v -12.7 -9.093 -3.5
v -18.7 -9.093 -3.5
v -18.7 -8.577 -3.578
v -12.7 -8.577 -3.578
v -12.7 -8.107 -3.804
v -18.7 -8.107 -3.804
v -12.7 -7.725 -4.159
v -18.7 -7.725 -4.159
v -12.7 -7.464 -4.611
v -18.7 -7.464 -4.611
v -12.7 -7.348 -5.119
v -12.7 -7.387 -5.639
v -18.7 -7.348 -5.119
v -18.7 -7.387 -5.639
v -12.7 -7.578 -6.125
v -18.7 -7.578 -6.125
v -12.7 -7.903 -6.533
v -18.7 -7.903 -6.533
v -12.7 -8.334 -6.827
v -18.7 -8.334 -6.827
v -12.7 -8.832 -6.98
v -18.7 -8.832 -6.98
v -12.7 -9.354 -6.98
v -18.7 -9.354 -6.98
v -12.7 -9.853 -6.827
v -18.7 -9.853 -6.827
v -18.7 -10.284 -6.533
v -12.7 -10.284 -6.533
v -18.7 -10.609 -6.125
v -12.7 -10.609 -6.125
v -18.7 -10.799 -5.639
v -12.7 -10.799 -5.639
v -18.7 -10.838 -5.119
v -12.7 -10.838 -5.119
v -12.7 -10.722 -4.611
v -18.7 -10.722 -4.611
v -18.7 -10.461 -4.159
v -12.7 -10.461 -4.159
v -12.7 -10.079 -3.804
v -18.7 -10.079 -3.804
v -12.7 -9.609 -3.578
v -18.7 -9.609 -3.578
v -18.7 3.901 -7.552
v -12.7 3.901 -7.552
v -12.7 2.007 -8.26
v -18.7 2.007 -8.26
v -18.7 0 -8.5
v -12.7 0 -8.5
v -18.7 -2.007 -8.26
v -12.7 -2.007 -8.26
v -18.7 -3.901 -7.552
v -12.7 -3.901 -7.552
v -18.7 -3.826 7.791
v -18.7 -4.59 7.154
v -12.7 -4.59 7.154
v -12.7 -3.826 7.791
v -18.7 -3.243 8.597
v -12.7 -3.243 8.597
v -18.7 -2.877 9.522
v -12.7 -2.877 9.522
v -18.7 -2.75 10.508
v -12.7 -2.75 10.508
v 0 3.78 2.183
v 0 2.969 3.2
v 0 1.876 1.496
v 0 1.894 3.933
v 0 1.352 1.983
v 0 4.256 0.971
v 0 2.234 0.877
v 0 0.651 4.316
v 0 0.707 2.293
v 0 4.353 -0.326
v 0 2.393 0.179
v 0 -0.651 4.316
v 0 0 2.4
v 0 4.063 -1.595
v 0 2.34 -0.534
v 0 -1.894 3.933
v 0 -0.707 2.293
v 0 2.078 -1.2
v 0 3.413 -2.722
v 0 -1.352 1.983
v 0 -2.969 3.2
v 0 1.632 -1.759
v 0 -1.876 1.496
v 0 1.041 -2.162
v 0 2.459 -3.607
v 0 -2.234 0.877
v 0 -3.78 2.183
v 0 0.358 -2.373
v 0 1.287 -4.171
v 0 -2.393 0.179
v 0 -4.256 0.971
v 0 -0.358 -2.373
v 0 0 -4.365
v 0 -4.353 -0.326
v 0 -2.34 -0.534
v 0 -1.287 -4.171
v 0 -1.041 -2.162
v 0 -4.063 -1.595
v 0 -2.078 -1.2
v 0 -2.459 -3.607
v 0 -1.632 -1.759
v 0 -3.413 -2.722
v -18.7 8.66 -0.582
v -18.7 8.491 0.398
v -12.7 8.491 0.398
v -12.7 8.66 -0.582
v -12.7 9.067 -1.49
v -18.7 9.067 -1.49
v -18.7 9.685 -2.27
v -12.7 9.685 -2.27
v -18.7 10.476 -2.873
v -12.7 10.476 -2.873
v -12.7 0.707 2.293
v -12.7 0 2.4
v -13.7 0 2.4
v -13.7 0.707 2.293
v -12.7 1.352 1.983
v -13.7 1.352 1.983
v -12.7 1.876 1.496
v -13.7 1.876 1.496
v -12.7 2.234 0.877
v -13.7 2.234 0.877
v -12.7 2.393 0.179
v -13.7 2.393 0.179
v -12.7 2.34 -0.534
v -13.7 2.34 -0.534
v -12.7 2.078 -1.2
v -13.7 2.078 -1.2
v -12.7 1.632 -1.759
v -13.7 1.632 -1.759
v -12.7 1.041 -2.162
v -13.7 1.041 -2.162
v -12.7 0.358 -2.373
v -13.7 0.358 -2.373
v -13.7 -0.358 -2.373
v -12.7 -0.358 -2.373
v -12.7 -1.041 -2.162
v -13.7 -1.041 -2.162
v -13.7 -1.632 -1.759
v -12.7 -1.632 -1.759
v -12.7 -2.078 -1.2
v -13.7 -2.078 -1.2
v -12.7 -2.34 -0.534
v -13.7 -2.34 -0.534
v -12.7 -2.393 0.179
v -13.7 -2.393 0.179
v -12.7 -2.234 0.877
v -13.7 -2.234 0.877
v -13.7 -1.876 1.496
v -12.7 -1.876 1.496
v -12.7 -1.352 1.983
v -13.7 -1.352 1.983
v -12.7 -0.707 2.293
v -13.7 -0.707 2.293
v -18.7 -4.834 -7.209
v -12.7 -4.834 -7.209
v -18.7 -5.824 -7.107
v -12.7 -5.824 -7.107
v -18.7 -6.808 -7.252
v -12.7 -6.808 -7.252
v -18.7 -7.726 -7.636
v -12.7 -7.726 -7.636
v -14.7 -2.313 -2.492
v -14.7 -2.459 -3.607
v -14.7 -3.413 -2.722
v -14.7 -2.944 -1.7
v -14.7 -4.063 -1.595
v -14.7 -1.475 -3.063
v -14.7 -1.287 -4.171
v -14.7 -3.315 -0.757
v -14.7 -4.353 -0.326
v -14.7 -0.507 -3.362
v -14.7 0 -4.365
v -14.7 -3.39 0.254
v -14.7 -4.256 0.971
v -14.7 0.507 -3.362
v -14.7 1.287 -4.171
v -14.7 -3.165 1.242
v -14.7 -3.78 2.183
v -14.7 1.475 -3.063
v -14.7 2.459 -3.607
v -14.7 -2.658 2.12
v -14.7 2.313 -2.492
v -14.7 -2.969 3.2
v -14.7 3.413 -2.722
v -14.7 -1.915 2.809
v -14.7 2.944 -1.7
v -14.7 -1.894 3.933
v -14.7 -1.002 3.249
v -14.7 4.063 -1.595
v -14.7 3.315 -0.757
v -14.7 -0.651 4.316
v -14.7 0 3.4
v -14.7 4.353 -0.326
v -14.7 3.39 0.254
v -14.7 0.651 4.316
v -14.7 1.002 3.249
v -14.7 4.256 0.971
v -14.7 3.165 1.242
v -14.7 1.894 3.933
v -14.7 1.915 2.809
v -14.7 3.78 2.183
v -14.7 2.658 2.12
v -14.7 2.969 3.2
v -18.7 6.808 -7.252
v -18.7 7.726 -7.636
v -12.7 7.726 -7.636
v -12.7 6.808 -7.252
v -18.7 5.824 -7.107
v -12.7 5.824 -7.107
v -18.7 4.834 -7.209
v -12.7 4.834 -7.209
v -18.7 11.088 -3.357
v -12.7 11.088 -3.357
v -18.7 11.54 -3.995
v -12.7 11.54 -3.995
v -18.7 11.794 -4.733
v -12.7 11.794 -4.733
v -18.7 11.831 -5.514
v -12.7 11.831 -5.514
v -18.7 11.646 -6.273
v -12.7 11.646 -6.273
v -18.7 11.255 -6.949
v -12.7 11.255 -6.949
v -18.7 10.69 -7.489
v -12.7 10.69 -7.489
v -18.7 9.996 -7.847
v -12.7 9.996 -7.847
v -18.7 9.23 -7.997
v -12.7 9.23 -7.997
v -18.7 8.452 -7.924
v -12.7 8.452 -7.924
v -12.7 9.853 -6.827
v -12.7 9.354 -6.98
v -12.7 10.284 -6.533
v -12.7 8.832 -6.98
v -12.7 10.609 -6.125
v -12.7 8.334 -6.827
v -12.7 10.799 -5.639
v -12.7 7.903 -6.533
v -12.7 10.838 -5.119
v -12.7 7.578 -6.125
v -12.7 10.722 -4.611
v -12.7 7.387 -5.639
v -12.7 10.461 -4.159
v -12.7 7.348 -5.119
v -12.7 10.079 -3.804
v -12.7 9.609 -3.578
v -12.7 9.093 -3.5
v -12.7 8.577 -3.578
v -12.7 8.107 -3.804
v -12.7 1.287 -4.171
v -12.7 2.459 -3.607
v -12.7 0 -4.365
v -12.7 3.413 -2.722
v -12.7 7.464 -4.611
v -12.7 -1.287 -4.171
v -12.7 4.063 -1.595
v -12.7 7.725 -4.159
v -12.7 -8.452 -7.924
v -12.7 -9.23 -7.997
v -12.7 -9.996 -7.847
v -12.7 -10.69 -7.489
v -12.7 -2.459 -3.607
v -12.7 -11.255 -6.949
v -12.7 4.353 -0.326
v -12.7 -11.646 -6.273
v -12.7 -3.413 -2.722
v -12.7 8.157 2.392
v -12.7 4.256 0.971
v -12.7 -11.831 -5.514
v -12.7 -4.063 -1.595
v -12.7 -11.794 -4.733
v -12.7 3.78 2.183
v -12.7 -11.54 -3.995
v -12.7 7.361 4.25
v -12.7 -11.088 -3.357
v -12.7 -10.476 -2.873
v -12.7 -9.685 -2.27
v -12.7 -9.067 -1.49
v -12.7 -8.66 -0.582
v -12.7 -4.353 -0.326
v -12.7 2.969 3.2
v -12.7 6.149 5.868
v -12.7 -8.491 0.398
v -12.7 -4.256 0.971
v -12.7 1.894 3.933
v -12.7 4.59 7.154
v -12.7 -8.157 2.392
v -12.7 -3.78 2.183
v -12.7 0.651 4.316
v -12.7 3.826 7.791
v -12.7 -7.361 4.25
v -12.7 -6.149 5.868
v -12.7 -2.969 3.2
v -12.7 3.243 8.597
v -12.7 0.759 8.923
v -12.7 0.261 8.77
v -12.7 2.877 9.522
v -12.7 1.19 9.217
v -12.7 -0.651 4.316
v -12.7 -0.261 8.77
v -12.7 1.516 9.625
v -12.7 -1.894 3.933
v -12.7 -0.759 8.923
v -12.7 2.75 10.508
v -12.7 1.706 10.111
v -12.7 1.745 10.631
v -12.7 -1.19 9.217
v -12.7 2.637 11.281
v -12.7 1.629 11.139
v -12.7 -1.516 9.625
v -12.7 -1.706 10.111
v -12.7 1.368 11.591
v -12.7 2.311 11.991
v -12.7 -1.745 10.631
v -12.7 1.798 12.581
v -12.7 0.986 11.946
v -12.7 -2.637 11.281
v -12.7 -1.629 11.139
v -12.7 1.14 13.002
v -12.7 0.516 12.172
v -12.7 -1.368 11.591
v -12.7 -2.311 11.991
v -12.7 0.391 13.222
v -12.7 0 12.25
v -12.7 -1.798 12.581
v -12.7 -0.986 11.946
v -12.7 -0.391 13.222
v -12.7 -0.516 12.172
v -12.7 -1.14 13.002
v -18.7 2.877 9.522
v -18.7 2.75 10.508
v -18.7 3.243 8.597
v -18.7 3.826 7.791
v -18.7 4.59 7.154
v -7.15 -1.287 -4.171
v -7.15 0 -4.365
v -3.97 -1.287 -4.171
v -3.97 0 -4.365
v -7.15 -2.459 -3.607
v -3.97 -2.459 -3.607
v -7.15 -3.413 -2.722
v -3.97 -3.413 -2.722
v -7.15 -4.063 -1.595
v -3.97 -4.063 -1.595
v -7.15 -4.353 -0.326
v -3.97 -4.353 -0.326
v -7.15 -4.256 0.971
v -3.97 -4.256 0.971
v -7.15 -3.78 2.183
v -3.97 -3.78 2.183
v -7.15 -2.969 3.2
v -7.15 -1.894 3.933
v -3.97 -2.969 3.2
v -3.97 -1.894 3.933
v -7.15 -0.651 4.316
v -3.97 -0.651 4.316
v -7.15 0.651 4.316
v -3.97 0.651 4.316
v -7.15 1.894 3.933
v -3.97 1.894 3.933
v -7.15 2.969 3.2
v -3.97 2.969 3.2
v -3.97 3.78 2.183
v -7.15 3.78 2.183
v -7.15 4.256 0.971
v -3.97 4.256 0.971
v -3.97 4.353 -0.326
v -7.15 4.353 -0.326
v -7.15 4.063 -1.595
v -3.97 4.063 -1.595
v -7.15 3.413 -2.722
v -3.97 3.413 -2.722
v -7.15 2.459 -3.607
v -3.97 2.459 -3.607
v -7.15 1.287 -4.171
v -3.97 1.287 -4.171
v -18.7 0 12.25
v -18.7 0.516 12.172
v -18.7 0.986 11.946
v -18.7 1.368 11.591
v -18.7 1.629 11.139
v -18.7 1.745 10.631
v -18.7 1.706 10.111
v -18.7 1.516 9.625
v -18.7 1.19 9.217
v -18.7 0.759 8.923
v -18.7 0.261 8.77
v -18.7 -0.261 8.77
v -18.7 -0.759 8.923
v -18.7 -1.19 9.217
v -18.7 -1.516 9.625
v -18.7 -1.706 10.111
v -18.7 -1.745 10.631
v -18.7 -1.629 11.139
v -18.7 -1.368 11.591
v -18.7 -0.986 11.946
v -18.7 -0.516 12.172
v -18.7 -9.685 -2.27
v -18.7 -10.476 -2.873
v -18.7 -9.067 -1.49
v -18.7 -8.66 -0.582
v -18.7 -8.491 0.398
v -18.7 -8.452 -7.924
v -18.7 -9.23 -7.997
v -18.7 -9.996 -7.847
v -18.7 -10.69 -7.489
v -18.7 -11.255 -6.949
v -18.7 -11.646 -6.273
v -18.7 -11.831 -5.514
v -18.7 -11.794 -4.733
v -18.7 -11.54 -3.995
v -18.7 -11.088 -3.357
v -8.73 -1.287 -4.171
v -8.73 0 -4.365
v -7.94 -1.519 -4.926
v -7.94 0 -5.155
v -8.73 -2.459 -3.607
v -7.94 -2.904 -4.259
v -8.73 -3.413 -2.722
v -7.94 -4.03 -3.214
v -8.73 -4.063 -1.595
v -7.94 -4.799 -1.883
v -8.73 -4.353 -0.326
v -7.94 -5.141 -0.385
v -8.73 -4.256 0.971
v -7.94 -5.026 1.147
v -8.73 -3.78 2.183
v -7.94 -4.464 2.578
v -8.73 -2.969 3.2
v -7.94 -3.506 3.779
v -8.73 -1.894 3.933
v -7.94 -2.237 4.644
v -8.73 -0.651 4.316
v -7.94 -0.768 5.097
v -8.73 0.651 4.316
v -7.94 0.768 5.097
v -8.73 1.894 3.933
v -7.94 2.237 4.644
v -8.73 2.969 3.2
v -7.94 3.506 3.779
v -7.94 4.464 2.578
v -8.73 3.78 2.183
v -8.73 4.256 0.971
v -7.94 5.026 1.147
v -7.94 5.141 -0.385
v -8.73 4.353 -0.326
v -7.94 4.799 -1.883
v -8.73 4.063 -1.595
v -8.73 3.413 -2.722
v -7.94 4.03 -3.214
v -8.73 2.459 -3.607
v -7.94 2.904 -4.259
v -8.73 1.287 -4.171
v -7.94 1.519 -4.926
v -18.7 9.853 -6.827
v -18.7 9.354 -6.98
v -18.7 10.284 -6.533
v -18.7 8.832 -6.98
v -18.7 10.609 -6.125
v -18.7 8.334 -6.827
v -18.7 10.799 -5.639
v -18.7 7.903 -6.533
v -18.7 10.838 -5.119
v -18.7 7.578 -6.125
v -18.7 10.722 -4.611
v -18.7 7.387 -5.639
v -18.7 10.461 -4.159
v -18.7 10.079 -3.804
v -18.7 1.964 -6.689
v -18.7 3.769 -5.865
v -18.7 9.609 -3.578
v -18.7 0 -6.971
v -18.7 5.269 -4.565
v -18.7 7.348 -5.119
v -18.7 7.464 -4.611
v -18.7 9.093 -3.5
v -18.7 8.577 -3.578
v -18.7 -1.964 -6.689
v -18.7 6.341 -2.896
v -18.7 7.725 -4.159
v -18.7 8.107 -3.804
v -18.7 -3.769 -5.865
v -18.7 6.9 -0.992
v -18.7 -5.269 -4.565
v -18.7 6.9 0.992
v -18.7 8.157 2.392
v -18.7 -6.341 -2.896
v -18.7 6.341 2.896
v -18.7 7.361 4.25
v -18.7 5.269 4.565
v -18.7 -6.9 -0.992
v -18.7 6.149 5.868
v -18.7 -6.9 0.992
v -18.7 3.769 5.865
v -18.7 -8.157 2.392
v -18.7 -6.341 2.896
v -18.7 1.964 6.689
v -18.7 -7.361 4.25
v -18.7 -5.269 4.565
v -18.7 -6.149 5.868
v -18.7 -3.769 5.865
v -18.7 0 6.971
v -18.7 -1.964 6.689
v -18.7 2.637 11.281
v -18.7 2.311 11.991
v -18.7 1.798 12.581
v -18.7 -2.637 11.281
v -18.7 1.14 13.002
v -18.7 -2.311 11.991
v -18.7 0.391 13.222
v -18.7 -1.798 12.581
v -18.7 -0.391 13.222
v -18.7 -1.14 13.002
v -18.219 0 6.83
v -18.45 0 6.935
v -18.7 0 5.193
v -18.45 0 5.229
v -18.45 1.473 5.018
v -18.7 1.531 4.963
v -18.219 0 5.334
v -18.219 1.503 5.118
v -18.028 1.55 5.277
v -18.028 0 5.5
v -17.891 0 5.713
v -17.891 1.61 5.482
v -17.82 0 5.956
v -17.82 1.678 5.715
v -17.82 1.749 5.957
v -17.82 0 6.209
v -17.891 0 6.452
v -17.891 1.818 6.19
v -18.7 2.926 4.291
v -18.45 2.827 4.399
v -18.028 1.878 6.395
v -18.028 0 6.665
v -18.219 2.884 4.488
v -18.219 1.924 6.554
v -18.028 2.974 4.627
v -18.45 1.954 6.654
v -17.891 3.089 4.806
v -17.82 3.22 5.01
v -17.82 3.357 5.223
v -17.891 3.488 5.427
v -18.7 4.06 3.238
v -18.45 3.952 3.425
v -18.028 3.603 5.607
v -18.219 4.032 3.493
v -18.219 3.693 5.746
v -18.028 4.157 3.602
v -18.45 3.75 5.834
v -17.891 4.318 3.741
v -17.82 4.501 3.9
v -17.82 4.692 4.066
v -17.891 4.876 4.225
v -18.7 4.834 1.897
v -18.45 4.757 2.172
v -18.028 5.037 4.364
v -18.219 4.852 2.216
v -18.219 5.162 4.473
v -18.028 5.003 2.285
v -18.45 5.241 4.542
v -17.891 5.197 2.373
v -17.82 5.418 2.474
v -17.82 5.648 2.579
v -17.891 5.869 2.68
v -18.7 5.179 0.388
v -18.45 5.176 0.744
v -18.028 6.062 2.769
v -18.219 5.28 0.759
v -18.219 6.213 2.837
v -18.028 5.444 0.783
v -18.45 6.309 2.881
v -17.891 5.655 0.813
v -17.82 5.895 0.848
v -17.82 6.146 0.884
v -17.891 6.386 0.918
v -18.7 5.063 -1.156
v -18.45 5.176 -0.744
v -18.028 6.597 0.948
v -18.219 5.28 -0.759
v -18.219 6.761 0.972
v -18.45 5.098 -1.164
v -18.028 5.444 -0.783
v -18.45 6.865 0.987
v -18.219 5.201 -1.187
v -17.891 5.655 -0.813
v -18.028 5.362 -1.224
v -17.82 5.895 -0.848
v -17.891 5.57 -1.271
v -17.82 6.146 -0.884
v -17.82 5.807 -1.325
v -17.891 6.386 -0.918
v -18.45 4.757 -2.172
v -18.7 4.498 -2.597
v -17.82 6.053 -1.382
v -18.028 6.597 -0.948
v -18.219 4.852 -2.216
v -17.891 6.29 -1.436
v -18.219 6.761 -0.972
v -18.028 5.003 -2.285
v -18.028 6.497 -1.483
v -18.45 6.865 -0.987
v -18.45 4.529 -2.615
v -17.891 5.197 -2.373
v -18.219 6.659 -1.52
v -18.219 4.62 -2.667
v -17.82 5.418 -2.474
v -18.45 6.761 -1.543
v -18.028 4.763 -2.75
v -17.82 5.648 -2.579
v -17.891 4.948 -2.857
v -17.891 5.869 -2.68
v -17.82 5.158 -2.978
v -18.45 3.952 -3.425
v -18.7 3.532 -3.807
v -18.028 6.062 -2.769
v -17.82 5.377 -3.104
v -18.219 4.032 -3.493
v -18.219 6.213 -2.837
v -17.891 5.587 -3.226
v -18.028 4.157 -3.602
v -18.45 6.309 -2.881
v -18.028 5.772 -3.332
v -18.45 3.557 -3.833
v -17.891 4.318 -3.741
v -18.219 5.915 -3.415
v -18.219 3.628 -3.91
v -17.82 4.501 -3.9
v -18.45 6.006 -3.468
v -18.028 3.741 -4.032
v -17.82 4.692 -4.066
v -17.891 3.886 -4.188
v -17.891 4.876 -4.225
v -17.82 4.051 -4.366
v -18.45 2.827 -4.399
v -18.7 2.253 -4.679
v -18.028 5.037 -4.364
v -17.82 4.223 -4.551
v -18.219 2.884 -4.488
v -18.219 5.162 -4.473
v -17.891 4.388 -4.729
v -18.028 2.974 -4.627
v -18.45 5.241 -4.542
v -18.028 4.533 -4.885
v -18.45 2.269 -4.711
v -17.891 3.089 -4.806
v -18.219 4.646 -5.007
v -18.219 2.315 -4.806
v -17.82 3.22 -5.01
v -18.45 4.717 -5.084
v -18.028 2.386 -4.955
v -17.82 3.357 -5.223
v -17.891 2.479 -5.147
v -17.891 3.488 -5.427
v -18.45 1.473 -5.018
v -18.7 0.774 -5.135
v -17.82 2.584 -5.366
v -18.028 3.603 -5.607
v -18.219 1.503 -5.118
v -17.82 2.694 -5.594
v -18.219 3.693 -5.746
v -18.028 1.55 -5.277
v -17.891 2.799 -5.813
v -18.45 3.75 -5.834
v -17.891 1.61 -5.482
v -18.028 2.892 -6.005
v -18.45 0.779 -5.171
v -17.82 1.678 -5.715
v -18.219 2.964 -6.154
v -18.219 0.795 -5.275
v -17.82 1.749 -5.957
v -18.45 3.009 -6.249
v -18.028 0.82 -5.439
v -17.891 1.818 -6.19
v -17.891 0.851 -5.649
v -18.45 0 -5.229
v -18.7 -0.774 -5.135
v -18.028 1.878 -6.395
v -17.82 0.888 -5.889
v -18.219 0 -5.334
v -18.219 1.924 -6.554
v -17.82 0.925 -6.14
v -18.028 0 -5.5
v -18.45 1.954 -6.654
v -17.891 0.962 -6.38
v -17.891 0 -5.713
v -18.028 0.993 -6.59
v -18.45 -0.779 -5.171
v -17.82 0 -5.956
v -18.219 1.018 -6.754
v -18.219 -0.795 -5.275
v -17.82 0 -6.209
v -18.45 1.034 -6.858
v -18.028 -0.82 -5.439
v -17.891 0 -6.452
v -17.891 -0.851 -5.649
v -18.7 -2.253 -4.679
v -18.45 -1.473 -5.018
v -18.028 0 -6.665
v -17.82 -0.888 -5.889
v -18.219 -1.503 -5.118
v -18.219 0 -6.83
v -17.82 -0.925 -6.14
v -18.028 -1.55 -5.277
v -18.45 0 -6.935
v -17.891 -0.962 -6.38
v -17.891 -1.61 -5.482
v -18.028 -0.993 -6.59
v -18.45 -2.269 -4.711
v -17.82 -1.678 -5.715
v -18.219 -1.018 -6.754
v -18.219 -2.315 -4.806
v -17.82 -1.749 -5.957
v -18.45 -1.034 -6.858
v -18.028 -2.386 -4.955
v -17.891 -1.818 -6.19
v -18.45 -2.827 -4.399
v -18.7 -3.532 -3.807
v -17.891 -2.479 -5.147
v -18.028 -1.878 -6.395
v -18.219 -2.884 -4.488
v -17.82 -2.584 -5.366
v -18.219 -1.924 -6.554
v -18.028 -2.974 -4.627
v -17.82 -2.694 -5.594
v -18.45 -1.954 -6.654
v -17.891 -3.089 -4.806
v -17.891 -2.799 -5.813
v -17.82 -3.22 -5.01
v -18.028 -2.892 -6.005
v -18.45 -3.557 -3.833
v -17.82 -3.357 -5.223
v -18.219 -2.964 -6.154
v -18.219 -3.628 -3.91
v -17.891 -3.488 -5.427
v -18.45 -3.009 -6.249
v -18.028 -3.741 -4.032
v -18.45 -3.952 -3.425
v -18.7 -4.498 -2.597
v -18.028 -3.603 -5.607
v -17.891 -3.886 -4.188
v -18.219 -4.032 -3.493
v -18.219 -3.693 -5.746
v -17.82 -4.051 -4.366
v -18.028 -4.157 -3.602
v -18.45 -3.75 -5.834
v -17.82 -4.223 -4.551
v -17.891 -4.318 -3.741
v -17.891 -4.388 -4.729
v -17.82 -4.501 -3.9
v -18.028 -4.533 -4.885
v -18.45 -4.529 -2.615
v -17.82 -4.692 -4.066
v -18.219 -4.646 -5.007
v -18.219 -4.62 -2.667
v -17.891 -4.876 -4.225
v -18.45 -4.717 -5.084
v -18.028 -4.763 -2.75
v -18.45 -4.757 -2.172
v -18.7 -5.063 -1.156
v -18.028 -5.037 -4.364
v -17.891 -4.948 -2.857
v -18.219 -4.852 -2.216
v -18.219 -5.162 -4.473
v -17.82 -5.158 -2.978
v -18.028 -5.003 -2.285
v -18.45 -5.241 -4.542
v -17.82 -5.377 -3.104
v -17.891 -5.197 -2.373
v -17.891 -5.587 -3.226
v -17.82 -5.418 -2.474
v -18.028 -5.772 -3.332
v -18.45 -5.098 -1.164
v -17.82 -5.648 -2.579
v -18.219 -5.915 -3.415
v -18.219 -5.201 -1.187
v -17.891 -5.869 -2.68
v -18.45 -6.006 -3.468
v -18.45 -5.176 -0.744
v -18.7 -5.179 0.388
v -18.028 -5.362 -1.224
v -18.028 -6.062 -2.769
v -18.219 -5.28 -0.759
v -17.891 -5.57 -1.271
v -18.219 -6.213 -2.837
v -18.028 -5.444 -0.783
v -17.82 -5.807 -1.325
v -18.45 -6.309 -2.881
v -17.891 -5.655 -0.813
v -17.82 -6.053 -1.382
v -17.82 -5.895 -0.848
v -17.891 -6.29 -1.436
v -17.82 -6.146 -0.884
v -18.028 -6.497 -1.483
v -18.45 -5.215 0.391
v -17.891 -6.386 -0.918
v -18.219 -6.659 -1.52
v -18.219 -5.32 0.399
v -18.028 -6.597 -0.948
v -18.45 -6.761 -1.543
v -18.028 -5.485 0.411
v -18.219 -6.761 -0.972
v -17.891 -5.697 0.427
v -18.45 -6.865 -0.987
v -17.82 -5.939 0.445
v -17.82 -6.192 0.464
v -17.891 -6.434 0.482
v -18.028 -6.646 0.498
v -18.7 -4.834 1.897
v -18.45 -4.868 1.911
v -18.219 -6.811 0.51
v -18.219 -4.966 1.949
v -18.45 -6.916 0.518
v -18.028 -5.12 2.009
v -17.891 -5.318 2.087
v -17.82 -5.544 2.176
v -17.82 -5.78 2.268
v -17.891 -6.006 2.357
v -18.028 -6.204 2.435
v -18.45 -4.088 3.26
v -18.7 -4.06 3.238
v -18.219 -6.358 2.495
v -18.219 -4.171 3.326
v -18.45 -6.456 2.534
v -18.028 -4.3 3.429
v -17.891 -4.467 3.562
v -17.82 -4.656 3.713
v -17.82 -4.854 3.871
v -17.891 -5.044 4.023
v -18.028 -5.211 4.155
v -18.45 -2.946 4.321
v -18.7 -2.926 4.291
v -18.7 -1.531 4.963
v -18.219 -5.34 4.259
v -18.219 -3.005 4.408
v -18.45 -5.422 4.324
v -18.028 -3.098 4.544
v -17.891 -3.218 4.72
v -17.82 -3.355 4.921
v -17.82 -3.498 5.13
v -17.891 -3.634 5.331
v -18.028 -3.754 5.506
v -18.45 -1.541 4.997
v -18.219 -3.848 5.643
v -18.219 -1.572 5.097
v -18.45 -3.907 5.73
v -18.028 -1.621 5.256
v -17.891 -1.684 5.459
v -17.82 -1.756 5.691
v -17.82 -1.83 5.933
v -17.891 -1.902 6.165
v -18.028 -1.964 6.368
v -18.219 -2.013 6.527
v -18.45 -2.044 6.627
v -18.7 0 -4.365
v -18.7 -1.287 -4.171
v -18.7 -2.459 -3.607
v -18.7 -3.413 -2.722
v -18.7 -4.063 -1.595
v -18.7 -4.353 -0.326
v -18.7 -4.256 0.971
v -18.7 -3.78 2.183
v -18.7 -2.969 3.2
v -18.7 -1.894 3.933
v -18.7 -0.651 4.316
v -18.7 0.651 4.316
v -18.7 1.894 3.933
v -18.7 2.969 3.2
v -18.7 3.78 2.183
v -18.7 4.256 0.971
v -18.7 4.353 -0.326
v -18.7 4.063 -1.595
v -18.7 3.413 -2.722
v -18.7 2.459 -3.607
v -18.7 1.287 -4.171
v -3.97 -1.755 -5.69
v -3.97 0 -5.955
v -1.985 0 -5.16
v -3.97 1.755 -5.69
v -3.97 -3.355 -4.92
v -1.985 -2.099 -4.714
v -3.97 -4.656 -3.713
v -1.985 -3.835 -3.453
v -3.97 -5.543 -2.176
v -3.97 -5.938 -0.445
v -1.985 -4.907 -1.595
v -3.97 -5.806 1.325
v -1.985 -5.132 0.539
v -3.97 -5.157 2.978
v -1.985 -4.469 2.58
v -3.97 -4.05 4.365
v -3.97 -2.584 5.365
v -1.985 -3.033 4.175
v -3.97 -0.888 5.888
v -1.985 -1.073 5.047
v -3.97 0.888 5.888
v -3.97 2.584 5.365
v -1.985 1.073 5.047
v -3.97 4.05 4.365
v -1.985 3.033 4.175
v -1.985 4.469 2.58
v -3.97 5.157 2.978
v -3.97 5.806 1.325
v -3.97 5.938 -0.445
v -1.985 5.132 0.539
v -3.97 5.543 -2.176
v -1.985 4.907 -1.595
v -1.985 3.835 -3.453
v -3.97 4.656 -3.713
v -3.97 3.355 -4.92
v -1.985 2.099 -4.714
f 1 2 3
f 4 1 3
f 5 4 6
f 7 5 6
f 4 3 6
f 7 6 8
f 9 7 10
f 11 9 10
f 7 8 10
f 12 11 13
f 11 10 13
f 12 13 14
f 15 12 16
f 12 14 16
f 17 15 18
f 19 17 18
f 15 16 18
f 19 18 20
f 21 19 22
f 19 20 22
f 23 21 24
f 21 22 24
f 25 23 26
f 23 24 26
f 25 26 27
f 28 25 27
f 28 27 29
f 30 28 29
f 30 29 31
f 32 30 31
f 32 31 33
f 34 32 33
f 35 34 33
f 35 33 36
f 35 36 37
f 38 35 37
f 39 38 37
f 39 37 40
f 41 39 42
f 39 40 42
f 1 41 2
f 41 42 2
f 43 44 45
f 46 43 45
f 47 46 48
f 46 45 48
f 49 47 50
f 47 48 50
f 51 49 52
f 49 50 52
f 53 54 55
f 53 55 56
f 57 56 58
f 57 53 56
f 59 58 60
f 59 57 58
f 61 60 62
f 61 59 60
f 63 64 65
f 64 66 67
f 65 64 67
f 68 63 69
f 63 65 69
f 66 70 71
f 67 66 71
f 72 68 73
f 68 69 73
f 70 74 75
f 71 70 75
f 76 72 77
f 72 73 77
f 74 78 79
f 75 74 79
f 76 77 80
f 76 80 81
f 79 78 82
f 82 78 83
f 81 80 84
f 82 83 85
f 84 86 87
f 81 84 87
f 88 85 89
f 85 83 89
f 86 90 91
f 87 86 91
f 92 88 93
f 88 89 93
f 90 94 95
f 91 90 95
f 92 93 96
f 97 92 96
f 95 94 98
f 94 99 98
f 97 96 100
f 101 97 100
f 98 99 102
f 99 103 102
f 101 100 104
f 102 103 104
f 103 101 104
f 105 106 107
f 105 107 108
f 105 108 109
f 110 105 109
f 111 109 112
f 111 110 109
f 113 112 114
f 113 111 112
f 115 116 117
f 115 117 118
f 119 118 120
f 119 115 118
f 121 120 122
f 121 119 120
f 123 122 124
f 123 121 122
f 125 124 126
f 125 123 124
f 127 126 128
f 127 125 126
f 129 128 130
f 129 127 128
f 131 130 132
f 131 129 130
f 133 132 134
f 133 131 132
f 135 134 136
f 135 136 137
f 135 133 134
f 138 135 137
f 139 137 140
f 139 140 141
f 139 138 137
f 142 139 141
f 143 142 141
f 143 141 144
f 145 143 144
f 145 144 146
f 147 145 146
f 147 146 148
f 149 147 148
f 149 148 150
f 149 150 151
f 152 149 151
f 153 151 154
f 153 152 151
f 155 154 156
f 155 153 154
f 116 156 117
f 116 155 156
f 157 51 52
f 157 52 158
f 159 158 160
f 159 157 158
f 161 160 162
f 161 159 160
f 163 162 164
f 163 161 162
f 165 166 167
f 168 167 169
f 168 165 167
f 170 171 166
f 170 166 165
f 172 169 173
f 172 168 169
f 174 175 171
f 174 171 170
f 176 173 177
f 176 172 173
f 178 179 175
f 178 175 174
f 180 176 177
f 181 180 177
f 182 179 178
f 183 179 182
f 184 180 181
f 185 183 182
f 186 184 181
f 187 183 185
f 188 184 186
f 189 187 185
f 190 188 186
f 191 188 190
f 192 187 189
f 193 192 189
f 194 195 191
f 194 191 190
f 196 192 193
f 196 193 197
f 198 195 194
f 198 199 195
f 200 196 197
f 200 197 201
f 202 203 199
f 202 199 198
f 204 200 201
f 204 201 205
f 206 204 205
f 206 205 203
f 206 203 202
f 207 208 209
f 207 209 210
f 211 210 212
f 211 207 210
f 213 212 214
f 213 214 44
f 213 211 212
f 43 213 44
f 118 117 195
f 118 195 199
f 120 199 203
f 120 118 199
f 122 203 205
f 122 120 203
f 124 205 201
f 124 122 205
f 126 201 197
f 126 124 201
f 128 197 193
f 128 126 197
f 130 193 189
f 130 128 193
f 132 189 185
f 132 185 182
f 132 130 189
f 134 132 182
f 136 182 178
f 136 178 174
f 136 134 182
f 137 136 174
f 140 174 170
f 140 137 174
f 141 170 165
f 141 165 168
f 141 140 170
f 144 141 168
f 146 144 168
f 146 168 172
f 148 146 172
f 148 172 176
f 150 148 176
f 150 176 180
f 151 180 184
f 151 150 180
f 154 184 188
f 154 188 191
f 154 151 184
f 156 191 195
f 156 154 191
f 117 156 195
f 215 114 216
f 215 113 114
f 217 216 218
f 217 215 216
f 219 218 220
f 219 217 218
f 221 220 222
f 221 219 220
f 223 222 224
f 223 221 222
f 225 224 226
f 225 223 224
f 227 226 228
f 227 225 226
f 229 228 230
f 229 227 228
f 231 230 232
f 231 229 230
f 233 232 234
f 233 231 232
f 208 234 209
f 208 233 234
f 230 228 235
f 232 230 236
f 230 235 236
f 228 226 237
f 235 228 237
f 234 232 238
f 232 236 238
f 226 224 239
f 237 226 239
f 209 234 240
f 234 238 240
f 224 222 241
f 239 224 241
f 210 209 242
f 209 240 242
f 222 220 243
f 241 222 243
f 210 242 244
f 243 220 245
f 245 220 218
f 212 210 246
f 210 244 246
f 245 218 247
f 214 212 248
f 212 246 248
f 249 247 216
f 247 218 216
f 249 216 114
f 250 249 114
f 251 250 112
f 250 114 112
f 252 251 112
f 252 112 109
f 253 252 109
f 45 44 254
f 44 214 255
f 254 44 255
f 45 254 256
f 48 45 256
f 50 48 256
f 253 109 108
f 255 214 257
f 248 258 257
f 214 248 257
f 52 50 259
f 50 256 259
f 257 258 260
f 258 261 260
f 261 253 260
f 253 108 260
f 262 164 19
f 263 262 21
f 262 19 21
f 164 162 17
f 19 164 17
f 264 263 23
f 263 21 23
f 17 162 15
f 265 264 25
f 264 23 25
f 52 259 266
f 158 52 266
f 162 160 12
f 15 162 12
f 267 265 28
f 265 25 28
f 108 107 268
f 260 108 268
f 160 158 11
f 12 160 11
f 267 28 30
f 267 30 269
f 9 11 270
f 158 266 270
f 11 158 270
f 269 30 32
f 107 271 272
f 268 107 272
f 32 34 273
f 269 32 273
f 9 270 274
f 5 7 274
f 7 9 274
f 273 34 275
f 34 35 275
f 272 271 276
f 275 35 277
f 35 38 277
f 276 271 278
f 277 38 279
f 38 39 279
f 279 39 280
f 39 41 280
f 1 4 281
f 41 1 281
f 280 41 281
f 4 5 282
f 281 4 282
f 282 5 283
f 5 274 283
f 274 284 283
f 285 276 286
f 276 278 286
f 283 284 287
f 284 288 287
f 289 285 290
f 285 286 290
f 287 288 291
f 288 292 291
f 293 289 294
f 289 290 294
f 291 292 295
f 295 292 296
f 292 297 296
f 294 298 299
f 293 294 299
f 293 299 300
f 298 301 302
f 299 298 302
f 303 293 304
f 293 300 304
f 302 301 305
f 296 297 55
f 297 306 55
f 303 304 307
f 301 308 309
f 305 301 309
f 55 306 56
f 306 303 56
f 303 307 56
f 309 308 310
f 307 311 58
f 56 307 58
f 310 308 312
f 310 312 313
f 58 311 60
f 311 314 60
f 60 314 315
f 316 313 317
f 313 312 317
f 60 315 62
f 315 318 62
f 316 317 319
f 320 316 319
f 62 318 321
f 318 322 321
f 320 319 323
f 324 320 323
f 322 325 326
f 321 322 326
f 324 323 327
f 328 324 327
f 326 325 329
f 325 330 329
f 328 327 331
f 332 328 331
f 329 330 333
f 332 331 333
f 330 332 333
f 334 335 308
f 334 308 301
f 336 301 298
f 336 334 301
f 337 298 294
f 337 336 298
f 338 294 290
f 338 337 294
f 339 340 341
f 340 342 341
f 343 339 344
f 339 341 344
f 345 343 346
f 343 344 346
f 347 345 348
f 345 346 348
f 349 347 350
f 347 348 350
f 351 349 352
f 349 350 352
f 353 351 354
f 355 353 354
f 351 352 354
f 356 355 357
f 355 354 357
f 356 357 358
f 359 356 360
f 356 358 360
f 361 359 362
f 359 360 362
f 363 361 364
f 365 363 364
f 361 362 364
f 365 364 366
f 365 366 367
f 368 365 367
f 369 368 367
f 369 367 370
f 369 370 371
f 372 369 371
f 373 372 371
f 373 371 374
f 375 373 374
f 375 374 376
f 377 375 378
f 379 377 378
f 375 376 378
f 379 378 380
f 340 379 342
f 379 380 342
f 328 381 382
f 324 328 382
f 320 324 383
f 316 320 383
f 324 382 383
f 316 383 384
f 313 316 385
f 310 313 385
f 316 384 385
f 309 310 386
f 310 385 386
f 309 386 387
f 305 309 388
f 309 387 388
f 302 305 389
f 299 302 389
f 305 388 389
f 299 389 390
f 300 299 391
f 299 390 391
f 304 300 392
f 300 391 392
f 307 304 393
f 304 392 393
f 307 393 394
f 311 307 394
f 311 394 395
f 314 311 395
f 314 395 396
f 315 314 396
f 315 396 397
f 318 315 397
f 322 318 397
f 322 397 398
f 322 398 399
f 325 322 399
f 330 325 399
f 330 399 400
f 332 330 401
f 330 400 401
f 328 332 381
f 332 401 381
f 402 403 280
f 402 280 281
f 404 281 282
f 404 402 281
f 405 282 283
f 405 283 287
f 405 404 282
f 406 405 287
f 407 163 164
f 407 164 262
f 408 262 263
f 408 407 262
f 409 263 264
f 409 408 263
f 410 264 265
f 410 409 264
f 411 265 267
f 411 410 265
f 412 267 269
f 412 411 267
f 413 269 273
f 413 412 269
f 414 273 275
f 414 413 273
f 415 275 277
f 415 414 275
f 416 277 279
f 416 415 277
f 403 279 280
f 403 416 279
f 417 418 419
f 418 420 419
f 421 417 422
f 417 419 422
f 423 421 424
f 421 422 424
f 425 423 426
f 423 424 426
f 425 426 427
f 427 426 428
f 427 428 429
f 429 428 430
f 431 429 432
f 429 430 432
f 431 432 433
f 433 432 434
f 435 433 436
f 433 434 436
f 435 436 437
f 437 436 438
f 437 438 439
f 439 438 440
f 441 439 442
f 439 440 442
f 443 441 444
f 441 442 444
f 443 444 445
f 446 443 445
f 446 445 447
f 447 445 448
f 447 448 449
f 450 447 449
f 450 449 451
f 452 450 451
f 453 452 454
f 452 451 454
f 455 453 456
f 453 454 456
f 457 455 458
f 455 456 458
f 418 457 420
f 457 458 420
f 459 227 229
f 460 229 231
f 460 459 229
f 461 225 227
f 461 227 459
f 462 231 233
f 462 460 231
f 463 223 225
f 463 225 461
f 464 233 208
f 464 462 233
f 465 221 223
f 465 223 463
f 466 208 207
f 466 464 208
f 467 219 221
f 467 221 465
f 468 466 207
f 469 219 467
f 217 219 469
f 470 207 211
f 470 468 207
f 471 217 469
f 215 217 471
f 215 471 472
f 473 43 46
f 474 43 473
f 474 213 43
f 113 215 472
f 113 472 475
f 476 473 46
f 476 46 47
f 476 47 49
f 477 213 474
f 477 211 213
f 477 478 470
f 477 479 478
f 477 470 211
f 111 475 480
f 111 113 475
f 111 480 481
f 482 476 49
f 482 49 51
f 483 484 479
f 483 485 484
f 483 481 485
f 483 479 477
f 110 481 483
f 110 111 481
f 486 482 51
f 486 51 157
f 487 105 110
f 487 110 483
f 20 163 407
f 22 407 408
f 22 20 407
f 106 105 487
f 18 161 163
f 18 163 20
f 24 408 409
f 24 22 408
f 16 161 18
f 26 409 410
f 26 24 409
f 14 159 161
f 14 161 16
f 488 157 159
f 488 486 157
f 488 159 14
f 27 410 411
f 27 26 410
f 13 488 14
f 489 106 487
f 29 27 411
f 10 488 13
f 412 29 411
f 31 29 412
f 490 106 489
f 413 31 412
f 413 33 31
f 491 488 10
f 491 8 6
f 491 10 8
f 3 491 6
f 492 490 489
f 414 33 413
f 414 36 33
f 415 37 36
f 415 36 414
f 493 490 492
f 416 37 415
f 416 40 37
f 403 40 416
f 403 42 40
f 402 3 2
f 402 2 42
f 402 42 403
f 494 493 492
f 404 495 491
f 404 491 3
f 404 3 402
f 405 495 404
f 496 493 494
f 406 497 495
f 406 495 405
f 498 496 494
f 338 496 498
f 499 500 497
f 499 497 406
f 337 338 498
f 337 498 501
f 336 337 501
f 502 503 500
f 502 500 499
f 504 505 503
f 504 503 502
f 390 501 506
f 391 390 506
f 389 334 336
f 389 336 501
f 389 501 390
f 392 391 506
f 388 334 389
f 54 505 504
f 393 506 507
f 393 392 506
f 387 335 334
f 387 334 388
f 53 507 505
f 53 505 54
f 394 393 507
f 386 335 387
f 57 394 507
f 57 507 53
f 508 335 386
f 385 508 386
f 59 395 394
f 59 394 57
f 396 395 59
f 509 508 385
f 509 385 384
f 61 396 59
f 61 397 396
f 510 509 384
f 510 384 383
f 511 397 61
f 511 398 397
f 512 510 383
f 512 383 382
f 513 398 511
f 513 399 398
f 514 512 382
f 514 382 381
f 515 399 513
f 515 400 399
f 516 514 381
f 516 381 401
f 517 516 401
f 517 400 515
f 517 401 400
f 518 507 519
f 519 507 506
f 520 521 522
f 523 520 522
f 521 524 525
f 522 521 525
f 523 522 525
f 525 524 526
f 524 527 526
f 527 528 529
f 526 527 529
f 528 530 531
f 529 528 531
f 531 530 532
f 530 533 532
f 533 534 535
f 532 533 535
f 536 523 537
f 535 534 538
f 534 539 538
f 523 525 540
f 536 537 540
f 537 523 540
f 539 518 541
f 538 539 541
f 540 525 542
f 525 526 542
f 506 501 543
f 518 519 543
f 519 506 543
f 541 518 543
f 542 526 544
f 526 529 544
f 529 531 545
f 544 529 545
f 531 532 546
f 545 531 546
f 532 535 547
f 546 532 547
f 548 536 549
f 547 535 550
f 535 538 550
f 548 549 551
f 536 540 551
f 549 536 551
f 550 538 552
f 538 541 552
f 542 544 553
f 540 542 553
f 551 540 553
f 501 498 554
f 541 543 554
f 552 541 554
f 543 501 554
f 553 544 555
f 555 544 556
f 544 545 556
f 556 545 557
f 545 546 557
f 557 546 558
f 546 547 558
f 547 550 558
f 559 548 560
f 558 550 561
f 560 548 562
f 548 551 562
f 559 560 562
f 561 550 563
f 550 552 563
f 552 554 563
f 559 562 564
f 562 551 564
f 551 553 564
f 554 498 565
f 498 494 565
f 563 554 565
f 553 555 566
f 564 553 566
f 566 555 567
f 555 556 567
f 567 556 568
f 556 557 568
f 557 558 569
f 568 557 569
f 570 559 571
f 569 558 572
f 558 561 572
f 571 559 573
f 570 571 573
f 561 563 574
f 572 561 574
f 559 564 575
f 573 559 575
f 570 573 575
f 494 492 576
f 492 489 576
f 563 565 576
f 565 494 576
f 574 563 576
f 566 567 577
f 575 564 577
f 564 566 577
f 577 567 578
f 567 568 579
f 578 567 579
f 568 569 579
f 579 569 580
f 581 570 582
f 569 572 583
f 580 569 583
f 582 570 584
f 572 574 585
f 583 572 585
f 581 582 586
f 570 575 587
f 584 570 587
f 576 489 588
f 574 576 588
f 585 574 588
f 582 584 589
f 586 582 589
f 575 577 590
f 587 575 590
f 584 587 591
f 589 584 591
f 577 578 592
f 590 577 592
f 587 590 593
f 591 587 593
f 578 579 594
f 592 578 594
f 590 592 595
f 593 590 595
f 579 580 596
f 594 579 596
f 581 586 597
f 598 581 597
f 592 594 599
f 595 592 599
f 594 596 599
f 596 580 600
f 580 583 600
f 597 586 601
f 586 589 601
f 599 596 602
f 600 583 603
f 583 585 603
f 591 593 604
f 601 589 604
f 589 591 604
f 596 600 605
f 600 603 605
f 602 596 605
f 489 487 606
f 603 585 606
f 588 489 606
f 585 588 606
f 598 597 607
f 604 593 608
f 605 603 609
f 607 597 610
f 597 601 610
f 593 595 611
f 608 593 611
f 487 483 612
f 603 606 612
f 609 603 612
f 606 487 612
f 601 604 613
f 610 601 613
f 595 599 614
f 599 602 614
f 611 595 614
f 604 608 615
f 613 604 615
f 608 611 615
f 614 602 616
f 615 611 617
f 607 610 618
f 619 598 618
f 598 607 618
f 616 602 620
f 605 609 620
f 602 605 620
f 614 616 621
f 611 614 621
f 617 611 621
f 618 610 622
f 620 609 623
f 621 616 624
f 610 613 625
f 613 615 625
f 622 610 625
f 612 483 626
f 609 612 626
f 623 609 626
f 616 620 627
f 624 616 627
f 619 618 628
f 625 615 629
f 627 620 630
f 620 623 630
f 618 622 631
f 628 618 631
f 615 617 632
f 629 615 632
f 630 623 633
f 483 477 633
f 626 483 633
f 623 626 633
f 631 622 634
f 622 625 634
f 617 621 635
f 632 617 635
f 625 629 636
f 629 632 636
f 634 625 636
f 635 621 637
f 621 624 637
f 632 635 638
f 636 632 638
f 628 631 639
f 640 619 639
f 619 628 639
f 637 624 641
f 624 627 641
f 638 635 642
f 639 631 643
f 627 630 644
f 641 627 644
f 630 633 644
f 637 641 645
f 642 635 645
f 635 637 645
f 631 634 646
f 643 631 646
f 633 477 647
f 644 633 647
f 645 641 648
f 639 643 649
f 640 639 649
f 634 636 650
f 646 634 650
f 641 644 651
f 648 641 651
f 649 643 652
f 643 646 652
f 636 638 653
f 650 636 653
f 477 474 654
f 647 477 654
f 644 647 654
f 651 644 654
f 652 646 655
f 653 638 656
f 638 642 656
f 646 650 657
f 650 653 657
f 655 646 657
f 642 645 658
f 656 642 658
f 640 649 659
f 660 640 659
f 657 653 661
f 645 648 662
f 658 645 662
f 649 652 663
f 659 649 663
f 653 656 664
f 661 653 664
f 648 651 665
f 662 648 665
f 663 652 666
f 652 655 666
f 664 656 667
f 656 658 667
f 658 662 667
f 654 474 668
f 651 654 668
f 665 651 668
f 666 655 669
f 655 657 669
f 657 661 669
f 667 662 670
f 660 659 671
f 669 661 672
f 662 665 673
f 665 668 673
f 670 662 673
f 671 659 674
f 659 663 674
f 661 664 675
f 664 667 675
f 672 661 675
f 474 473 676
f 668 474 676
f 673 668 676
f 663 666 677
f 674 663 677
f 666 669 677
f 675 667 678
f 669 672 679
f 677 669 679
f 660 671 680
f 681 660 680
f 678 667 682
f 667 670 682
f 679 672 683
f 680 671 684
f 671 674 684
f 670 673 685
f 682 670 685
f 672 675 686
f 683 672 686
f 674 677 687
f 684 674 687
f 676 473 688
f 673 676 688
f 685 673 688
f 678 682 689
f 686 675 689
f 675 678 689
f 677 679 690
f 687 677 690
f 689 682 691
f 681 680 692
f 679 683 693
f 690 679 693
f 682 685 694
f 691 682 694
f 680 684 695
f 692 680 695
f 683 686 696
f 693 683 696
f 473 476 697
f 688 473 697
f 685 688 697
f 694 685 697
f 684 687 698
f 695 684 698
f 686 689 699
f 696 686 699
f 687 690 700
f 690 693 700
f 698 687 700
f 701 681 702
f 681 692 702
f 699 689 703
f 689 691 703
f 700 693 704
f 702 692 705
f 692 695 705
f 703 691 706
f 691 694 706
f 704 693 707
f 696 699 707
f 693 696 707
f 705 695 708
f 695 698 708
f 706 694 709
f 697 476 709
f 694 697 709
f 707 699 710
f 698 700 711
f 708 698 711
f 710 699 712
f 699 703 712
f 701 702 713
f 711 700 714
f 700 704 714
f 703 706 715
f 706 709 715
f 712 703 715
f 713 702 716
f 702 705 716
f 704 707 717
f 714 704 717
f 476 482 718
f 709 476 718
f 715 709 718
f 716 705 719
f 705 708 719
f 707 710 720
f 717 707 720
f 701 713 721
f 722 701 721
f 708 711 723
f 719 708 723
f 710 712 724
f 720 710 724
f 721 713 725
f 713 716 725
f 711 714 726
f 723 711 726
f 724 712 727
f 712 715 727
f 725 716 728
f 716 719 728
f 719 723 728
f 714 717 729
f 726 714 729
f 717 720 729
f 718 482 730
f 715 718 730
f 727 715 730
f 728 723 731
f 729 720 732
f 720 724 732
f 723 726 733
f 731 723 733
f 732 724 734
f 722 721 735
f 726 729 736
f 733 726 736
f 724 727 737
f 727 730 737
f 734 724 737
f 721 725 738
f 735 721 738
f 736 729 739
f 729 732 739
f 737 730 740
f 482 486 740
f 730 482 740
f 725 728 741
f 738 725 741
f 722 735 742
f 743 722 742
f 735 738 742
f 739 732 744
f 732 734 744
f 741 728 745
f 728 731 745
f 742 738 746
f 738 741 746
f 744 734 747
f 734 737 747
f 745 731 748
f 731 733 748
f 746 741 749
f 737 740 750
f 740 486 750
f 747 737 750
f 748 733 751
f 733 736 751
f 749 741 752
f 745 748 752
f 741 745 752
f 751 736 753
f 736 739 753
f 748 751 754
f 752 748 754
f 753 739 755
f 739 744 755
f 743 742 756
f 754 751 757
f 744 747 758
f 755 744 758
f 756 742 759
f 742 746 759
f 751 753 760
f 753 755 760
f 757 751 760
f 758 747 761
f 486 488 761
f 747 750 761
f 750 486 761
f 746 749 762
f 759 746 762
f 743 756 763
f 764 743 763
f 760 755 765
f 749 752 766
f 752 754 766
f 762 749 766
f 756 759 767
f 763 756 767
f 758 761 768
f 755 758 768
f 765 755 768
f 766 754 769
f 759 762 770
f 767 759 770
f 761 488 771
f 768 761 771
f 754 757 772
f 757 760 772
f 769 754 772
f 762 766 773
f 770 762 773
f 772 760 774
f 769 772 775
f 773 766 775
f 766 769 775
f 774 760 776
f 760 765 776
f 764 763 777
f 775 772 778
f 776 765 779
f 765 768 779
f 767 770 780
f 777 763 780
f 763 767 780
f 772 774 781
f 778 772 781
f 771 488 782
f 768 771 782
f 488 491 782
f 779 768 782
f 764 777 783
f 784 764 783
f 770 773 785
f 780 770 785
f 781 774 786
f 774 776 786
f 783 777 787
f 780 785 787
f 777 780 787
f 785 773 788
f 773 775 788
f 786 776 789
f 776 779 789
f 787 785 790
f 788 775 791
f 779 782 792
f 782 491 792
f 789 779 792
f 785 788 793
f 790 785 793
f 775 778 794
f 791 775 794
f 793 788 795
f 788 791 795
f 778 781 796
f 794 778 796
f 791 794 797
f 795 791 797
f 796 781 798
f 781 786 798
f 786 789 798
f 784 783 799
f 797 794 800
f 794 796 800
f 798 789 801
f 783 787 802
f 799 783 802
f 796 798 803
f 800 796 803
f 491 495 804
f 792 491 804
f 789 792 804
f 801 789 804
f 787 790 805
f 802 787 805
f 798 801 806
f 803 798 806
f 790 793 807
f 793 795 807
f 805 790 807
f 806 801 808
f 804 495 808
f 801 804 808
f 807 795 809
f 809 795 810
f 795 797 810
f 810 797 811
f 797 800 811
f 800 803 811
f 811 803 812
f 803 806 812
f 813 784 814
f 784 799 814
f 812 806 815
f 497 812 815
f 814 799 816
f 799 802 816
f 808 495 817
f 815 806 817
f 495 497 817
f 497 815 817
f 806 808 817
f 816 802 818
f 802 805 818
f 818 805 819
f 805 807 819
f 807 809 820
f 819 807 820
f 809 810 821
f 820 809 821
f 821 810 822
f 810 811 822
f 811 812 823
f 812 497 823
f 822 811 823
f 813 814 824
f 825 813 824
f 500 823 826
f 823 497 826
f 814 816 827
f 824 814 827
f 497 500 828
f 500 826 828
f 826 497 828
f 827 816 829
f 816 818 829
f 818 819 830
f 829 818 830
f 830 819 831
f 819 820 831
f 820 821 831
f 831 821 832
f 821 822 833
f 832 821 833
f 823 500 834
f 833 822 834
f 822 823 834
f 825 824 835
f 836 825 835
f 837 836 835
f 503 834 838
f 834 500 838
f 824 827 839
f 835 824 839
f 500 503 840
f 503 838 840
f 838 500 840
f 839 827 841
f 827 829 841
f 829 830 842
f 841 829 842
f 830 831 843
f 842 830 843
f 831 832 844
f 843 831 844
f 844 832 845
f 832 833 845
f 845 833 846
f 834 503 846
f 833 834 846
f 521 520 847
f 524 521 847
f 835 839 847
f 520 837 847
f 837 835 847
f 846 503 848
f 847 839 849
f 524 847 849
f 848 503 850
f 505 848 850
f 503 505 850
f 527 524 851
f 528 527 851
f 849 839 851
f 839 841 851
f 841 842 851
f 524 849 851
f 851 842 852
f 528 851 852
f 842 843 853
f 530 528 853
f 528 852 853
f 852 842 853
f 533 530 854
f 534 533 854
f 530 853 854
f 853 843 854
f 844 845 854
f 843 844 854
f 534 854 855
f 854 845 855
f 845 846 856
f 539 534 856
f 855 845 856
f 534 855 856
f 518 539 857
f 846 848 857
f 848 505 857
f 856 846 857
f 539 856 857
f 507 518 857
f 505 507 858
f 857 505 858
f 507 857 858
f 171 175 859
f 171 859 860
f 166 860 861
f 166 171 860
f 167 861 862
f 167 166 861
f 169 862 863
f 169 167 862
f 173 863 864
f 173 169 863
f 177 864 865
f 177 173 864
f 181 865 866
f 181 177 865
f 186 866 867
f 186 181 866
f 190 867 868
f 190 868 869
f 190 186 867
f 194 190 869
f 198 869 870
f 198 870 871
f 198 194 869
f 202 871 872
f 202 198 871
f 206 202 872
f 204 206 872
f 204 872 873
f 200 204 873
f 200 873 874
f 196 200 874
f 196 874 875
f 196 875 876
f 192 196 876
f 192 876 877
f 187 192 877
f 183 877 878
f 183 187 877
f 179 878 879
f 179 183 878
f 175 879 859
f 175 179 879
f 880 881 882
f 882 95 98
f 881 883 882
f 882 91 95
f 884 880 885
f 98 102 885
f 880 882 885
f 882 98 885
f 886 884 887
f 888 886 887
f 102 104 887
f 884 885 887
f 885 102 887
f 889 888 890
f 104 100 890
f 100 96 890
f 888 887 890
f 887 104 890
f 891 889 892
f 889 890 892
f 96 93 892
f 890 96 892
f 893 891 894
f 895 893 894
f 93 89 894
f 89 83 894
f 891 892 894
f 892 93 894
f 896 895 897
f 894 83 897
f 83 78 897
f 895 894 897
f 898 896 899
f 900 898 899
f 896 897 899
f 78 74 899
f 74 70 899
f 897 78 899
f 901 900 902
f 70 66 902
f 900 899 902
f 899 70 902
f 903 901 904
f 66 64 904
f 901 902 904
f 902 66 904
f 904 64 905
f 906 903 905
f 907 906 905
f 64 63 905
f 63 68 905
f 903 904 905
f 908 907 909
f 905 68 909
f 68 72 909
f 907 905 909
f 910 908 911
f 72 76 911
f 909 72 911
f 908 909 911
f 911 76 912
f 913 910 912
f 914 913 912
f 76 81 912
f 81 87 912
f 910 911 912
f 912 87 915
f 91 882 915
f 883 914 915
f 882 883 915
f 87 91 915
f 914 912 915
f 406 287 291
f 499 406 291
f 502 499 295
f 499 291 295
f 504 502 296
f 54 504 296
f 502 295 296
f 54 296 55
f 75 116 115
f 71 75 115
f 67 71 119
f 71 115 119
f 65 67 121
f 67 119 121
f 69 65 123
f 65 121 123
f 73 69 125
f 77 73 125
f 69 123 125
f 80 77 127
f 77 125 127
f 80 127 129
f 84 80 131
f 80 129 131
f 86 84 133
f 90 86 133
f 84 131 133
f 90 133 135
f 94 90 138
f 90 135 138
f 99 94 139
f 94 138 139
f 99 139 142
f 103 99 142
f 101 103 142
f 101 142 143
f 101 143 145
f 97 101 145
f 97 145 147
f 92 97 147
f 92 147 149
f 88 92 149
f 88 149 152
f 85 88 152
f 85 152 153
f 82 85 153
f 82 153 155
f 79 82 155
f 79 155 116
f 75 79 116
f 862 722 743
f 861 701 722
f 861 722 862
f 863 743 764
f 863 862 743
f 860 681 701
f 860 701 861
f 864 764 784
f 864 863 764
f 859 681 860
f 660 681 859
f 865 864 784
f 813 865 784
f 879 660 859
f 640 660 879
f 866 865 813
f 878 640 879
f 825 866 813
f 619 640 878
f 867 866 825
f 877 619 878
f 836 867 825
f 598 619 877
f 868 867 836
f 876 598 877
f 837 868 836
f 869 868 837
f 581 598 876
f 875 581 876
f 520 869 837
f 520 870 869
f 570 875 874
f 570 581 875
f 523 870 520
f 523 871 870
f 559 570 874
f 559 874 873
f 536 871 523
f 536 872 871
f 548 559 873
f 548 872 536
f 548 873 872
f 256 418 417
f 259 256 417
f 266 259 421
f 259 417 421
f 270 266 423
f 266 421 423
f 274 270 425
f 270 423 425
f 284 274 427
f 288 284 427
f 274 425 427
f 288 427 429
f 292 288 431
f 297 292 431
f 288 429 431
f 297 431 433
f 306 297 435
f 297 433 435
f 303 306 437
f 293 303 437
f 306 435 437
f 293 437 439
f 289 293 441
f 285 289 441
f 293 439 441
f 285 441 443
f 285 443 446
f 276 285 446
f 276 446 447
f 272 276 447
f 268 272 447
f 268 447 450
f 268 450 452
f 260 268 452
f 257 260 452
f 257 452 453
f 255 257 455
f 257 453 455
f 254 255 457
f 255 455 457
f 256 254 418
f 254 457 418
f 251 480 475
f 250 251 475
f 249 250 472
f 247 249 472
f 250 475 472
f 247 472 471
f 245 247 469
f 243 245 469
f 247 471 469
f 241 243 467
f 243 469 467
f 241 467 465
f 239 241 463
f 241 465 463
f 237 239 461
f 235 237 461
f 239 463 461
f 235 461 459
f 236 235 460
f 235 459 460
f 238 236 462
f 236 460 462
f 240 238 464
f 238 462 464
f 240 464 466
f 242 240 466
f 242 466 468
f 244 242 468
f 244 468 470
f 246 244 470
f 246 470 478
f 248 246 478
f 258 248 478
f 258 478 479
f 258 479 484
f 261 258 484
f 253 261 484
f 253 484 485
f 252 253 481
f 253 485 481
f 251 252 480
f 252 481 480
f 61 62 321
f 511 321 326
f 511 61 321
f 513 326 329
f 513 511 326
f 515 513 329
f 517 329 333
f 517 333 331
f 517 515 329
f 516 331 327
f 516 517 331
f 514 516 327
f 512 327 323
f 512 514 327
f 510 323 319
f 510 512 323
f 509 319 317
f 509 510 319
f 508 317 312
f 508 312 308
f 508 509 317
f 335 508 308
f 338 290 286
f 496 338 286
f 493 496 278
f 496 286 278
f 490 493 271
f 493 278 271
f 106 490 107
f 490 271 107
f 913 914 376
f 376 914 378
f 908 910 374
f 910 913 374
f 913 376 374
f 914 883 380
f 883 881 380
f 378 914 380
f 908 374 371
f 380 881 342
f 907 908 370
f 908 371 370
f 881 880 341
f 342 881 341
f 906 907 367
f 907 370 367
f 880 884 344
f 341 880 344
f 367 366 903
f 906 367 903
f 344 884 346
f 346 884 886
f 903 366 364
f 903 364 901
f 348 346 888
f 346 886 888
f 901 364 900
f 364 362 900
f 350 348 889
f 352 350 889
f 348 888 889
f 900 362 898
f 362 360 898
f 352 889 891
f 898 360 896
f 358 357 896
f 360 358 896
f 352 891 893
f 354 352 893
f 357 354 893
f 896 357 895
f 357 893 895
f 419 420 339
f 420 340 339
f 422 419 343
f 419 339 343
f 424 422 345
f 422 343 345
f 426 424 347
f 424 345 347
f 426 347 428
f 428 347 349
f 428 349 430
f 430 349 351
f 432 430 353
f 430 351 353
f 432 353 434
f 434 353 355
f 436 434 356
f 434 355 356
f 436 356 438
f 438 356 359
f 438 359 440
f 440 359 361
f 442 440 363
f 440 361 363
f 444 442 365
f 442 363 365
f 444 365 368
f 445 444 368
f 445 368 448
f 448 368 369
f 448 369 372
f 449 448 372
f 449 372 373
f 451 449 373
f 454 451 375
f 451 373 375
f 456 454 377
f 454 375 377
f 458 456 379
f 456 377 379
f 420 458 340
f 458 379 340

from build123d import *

# Parameters (mm, degrees)
SKETCH4_R            = 8.5
SKETCH4_R_2          = 4.365
SKETCH4_R_3          = 3.8
SKETCH4_R_4          = 2.4
BOSS_EXTRUDE1_DEPTH  = 2
BOSS_EXTRUDE2_START  = 2
SKETCH4_3_R          = 8.5
SKETCH4_3_R_2        = 4.365
BOSS_EXTRUDE2_DEPTH  = 4
SKETCH4_4_R          = 2.4
CUT_EXTRUDE2_DEPTH   = 18.486852204
CUT_SWEEP1_PROFILE_R = 0.889
SKETCH14_R           = 2.75
SKETCH14_R_2         = 1.75
BOSS_EXTRUDE3_DEPTH  = 6
FILLET3_R            = 4
CHAMFER1_SIZE        = 1


with BuildPart() as part:
    # Sketch1 → Revolve1 (revolve)
    with BuildSketch(Plane(origin=(0, 0, 0), x_dir=(1, 0, 0), z_dir=(0, 1, 0))):
        Polygon((0, 0), (-12.7, 0), (-12.7, 4.365), (-8.73, 4.365), (-7.94, 5.155), (-7.15, 4.365), (-3.97, 4.365), (-3.97, 5.955), (0, 4.365), align=None)
    revolve(axis=Axis((0, 0, 0), (-1, 0, 0)))

    # Sketch4 → Boss-Extrude1 (add)
    # profile 1 of 3: a face of its own
    with BuildSketch(Plane.ZY.offset(12.7)):
        Circle(SKETCH4_R)
        with Locations(Location((0, 0, 0), (0, 0, 180))):
            Circle(SKETCH4_R_2, mode=Mode.SUBTRACT)
    # profile 2 of 3: a face of its own
    with BuildSketch(Plane.ZY.offset(12.7)):
        with Locations(Location((0, 0, 0), (0, 0, 180))):
            Circle(SKETCH4_R_2)
        Circle(SKETCH4_R_3, mode=Mode.SUBTRACT)
    # profile 3 of 3: a face of its own
    with BuildSketch(Plane.ZY.offset(12.7)):
        Circle(SKETCH4_R_3)
        Circle(SKETCH4_R_4, mode=Mode.SUBTRACT)
    extrude(amount=BOSS_EXTRUDE1_DEPTH)

    # Sketch4<3> → Boss-Extrude2 (add)
    with BuildSketch(Plane.ZY.offset(12.7).offset(BOSS_EXTRUDE2_START)):
        Circle(SKETCH4_3_R)
        with Locations(Location((0, 0, 0), (0, 0, 180))):
            Circle(SKETCH4_3_R_2, mode=Mode.SUBTRACT)
    extrude(amount=BOSS_EXTRUDE2_DEPTH)

    # Sketch4<4> → Cut-Extrude2 (cut, through all)
    with BuildSketch(Plane.ZY.offset(12.7)):
        Circle(SKETCH4_4_R)
    extrude(amount=-CUT_EXTRUDE2_DEPTH, mode=Mode.SUBTRACT)

    # Cut-Sweep1: sweep along a path in Sketch5
    with BuildLine(Plane.ZY.offset(18.7)) as cut_sweep1_path:
        CenterArc((0, 0), 6.082351302, 0, 360)
    # Cut-Sweep1 profile (on start of the path) → Cut-Sweep1 (sweep, cut)
    with BuildSketch(Plane(origin=(-18.7, 0, 6.082351302), x_dir=(0, 0, 1), z_dir=(0, 1, 0))):
        Circle(CUT_SWEEP1_PROFILE_R)
    sweep(path=cut_sweep1_path.line, mode=Mode.SUBTRACT)

    # Sketch14 → Boss-Extrude3 (add)
    # profile 1 of 3: a face of its own
    with BuildSketch(Plane.ZY.offset(18.7)):
        with Locations((10.5, 0)):
            Circle(SKETCH14_R)
        with Locations((10.5, 0)):
            Circle(SKETCH14_R_2, mode=Mode.SUBTRACT)
    # profile 2 of 3: a face of its own
    with BuildSketch(Plane.ZY.offset(18.7)):
        with Locations((-5.25, -9.09326674)):
            Circle(SKETCH14_R)
        with Locations((-5.25, -9.09326674)):
            Circle(SKETCH14_R_2, mode=Mode.SUBTRACT)
    # profile 3 of 3: a face of its own
    with BuildSketch(Plane.ZY.offset(18.7)):
        with Locations((-5.25, 9.09326674)):
            Circle(SKETCH14_R)
        with Locations((-5.25, 9.09326674)):
            Circle(SKETCH14_R_2, mode=Mode.SUBTRACT)
    extrude(amount=-BOSS_EXTRUDE3_DEPTH)

    # Fillet3
    # the kernel refuses this fillet: 4 mm, written as the material it adds along each edge
    with BuildSketch(Plane(origin=(-18.7, 8.059160345, -2.701839101), x_dir=(0, 0.13787930988752692, 0.9904490375102291), z_dir=(1, 0, 0))) as fillet3_piece_1:
        with BuildLine():
            CenterArc((3.866081399, -3.931630738), FILLET3_R, 100.608613334, 57.139697136)
            ThreePointArc((0.163964046, -2.4169271), (0.362452033, -1.189436498), (0, 0))
            ThreePointArc((0, 0), (1.564842471, -0.145284682), (3.129684942, 0))
        make_face()
    extrude(amount=6)
    with BuildSketch(Plane(origin=(-18.7, 6.369441471, -5.628518041), x_dir=(0, 0.559831667079214, -0.8286063628378122), z_dir=(1, 0, 0)), Plane(origin=(-18.7, -8.059160345, -2.701839101), x_dir=(0, -0.9975099934945784, -0.07052526411468515), z_dir=(1, 0, 0))) as fillet3_piece_2:
        with BuildLine():
            CenterArc((4.184287724, -3.591105941), FILLET3_R, 116.132681907, 57.139697136)
            ThreePointArc((0.211830564, -3.12250791), (0.250866796, -1.551420461), (0, 0))
            ThreePointArc((0, 0), (1.211241183, -0.281114665), (2.422482367, 0))
        make_face()
    extrude(amount=6)
    with BuildSketch(Plane(origin=(-18.7, -6.369441471, -5.628518041), x_dir=(0, -0.5598316670792142, -0.8286063628378122), z_dir=(1, 0, 0)), Plane(origin=(-18.7, -1.689718874, 8.330357143), x_dir=(0, -0.43767832641536075, 0.8991316269524996), z_dir=(1, 0, 0))) as fillet3_piece_3:
        with BuildLine():
            CenterArc((4.184287724, 3.591105941), FILLET3_R, 186.727620957, 57.139697136)
            ThreePointArc((0.211830564, 3.12250791), (0.250866796, 1.551420461), (0, 0))
            ThreePointArc((0, 0), (1.211241183, 0.281114665), (2.422482367, 0))
        make_face()
    extrude(amount=6)
    with BuildSketch(Plane(origin=(-18.7, 1.689718874, 8.330357143), x_dir=(0, 0.9266936825814681, -0.3758175337362501), z_dir=(1, 0, 0))) as fillet3_piece_4:
        with BuildLine():
            CenterArc((3.866081399, 3.931630738), FILLET3_R, 202.25168953, 57.139697136)
            ThreePointArc((0.163964046, 2.4169271), (0.362452033, 1.189436498), (0, 0))
            ThreePointArc((0, 0), (1.564842471, 0.145284682), (3.129684942, 0))
        make_face()
    extrude(amount=6)

    # Chamfer1
    chamfer1_edges = [part.edges().sort_by_distance(p)[0] for p in [
        (-14.7, 0, -2.4),
    ]]
    chamfer(chamfer1_edges, length=CHAMFER1_SIZE)


solid = part.part
